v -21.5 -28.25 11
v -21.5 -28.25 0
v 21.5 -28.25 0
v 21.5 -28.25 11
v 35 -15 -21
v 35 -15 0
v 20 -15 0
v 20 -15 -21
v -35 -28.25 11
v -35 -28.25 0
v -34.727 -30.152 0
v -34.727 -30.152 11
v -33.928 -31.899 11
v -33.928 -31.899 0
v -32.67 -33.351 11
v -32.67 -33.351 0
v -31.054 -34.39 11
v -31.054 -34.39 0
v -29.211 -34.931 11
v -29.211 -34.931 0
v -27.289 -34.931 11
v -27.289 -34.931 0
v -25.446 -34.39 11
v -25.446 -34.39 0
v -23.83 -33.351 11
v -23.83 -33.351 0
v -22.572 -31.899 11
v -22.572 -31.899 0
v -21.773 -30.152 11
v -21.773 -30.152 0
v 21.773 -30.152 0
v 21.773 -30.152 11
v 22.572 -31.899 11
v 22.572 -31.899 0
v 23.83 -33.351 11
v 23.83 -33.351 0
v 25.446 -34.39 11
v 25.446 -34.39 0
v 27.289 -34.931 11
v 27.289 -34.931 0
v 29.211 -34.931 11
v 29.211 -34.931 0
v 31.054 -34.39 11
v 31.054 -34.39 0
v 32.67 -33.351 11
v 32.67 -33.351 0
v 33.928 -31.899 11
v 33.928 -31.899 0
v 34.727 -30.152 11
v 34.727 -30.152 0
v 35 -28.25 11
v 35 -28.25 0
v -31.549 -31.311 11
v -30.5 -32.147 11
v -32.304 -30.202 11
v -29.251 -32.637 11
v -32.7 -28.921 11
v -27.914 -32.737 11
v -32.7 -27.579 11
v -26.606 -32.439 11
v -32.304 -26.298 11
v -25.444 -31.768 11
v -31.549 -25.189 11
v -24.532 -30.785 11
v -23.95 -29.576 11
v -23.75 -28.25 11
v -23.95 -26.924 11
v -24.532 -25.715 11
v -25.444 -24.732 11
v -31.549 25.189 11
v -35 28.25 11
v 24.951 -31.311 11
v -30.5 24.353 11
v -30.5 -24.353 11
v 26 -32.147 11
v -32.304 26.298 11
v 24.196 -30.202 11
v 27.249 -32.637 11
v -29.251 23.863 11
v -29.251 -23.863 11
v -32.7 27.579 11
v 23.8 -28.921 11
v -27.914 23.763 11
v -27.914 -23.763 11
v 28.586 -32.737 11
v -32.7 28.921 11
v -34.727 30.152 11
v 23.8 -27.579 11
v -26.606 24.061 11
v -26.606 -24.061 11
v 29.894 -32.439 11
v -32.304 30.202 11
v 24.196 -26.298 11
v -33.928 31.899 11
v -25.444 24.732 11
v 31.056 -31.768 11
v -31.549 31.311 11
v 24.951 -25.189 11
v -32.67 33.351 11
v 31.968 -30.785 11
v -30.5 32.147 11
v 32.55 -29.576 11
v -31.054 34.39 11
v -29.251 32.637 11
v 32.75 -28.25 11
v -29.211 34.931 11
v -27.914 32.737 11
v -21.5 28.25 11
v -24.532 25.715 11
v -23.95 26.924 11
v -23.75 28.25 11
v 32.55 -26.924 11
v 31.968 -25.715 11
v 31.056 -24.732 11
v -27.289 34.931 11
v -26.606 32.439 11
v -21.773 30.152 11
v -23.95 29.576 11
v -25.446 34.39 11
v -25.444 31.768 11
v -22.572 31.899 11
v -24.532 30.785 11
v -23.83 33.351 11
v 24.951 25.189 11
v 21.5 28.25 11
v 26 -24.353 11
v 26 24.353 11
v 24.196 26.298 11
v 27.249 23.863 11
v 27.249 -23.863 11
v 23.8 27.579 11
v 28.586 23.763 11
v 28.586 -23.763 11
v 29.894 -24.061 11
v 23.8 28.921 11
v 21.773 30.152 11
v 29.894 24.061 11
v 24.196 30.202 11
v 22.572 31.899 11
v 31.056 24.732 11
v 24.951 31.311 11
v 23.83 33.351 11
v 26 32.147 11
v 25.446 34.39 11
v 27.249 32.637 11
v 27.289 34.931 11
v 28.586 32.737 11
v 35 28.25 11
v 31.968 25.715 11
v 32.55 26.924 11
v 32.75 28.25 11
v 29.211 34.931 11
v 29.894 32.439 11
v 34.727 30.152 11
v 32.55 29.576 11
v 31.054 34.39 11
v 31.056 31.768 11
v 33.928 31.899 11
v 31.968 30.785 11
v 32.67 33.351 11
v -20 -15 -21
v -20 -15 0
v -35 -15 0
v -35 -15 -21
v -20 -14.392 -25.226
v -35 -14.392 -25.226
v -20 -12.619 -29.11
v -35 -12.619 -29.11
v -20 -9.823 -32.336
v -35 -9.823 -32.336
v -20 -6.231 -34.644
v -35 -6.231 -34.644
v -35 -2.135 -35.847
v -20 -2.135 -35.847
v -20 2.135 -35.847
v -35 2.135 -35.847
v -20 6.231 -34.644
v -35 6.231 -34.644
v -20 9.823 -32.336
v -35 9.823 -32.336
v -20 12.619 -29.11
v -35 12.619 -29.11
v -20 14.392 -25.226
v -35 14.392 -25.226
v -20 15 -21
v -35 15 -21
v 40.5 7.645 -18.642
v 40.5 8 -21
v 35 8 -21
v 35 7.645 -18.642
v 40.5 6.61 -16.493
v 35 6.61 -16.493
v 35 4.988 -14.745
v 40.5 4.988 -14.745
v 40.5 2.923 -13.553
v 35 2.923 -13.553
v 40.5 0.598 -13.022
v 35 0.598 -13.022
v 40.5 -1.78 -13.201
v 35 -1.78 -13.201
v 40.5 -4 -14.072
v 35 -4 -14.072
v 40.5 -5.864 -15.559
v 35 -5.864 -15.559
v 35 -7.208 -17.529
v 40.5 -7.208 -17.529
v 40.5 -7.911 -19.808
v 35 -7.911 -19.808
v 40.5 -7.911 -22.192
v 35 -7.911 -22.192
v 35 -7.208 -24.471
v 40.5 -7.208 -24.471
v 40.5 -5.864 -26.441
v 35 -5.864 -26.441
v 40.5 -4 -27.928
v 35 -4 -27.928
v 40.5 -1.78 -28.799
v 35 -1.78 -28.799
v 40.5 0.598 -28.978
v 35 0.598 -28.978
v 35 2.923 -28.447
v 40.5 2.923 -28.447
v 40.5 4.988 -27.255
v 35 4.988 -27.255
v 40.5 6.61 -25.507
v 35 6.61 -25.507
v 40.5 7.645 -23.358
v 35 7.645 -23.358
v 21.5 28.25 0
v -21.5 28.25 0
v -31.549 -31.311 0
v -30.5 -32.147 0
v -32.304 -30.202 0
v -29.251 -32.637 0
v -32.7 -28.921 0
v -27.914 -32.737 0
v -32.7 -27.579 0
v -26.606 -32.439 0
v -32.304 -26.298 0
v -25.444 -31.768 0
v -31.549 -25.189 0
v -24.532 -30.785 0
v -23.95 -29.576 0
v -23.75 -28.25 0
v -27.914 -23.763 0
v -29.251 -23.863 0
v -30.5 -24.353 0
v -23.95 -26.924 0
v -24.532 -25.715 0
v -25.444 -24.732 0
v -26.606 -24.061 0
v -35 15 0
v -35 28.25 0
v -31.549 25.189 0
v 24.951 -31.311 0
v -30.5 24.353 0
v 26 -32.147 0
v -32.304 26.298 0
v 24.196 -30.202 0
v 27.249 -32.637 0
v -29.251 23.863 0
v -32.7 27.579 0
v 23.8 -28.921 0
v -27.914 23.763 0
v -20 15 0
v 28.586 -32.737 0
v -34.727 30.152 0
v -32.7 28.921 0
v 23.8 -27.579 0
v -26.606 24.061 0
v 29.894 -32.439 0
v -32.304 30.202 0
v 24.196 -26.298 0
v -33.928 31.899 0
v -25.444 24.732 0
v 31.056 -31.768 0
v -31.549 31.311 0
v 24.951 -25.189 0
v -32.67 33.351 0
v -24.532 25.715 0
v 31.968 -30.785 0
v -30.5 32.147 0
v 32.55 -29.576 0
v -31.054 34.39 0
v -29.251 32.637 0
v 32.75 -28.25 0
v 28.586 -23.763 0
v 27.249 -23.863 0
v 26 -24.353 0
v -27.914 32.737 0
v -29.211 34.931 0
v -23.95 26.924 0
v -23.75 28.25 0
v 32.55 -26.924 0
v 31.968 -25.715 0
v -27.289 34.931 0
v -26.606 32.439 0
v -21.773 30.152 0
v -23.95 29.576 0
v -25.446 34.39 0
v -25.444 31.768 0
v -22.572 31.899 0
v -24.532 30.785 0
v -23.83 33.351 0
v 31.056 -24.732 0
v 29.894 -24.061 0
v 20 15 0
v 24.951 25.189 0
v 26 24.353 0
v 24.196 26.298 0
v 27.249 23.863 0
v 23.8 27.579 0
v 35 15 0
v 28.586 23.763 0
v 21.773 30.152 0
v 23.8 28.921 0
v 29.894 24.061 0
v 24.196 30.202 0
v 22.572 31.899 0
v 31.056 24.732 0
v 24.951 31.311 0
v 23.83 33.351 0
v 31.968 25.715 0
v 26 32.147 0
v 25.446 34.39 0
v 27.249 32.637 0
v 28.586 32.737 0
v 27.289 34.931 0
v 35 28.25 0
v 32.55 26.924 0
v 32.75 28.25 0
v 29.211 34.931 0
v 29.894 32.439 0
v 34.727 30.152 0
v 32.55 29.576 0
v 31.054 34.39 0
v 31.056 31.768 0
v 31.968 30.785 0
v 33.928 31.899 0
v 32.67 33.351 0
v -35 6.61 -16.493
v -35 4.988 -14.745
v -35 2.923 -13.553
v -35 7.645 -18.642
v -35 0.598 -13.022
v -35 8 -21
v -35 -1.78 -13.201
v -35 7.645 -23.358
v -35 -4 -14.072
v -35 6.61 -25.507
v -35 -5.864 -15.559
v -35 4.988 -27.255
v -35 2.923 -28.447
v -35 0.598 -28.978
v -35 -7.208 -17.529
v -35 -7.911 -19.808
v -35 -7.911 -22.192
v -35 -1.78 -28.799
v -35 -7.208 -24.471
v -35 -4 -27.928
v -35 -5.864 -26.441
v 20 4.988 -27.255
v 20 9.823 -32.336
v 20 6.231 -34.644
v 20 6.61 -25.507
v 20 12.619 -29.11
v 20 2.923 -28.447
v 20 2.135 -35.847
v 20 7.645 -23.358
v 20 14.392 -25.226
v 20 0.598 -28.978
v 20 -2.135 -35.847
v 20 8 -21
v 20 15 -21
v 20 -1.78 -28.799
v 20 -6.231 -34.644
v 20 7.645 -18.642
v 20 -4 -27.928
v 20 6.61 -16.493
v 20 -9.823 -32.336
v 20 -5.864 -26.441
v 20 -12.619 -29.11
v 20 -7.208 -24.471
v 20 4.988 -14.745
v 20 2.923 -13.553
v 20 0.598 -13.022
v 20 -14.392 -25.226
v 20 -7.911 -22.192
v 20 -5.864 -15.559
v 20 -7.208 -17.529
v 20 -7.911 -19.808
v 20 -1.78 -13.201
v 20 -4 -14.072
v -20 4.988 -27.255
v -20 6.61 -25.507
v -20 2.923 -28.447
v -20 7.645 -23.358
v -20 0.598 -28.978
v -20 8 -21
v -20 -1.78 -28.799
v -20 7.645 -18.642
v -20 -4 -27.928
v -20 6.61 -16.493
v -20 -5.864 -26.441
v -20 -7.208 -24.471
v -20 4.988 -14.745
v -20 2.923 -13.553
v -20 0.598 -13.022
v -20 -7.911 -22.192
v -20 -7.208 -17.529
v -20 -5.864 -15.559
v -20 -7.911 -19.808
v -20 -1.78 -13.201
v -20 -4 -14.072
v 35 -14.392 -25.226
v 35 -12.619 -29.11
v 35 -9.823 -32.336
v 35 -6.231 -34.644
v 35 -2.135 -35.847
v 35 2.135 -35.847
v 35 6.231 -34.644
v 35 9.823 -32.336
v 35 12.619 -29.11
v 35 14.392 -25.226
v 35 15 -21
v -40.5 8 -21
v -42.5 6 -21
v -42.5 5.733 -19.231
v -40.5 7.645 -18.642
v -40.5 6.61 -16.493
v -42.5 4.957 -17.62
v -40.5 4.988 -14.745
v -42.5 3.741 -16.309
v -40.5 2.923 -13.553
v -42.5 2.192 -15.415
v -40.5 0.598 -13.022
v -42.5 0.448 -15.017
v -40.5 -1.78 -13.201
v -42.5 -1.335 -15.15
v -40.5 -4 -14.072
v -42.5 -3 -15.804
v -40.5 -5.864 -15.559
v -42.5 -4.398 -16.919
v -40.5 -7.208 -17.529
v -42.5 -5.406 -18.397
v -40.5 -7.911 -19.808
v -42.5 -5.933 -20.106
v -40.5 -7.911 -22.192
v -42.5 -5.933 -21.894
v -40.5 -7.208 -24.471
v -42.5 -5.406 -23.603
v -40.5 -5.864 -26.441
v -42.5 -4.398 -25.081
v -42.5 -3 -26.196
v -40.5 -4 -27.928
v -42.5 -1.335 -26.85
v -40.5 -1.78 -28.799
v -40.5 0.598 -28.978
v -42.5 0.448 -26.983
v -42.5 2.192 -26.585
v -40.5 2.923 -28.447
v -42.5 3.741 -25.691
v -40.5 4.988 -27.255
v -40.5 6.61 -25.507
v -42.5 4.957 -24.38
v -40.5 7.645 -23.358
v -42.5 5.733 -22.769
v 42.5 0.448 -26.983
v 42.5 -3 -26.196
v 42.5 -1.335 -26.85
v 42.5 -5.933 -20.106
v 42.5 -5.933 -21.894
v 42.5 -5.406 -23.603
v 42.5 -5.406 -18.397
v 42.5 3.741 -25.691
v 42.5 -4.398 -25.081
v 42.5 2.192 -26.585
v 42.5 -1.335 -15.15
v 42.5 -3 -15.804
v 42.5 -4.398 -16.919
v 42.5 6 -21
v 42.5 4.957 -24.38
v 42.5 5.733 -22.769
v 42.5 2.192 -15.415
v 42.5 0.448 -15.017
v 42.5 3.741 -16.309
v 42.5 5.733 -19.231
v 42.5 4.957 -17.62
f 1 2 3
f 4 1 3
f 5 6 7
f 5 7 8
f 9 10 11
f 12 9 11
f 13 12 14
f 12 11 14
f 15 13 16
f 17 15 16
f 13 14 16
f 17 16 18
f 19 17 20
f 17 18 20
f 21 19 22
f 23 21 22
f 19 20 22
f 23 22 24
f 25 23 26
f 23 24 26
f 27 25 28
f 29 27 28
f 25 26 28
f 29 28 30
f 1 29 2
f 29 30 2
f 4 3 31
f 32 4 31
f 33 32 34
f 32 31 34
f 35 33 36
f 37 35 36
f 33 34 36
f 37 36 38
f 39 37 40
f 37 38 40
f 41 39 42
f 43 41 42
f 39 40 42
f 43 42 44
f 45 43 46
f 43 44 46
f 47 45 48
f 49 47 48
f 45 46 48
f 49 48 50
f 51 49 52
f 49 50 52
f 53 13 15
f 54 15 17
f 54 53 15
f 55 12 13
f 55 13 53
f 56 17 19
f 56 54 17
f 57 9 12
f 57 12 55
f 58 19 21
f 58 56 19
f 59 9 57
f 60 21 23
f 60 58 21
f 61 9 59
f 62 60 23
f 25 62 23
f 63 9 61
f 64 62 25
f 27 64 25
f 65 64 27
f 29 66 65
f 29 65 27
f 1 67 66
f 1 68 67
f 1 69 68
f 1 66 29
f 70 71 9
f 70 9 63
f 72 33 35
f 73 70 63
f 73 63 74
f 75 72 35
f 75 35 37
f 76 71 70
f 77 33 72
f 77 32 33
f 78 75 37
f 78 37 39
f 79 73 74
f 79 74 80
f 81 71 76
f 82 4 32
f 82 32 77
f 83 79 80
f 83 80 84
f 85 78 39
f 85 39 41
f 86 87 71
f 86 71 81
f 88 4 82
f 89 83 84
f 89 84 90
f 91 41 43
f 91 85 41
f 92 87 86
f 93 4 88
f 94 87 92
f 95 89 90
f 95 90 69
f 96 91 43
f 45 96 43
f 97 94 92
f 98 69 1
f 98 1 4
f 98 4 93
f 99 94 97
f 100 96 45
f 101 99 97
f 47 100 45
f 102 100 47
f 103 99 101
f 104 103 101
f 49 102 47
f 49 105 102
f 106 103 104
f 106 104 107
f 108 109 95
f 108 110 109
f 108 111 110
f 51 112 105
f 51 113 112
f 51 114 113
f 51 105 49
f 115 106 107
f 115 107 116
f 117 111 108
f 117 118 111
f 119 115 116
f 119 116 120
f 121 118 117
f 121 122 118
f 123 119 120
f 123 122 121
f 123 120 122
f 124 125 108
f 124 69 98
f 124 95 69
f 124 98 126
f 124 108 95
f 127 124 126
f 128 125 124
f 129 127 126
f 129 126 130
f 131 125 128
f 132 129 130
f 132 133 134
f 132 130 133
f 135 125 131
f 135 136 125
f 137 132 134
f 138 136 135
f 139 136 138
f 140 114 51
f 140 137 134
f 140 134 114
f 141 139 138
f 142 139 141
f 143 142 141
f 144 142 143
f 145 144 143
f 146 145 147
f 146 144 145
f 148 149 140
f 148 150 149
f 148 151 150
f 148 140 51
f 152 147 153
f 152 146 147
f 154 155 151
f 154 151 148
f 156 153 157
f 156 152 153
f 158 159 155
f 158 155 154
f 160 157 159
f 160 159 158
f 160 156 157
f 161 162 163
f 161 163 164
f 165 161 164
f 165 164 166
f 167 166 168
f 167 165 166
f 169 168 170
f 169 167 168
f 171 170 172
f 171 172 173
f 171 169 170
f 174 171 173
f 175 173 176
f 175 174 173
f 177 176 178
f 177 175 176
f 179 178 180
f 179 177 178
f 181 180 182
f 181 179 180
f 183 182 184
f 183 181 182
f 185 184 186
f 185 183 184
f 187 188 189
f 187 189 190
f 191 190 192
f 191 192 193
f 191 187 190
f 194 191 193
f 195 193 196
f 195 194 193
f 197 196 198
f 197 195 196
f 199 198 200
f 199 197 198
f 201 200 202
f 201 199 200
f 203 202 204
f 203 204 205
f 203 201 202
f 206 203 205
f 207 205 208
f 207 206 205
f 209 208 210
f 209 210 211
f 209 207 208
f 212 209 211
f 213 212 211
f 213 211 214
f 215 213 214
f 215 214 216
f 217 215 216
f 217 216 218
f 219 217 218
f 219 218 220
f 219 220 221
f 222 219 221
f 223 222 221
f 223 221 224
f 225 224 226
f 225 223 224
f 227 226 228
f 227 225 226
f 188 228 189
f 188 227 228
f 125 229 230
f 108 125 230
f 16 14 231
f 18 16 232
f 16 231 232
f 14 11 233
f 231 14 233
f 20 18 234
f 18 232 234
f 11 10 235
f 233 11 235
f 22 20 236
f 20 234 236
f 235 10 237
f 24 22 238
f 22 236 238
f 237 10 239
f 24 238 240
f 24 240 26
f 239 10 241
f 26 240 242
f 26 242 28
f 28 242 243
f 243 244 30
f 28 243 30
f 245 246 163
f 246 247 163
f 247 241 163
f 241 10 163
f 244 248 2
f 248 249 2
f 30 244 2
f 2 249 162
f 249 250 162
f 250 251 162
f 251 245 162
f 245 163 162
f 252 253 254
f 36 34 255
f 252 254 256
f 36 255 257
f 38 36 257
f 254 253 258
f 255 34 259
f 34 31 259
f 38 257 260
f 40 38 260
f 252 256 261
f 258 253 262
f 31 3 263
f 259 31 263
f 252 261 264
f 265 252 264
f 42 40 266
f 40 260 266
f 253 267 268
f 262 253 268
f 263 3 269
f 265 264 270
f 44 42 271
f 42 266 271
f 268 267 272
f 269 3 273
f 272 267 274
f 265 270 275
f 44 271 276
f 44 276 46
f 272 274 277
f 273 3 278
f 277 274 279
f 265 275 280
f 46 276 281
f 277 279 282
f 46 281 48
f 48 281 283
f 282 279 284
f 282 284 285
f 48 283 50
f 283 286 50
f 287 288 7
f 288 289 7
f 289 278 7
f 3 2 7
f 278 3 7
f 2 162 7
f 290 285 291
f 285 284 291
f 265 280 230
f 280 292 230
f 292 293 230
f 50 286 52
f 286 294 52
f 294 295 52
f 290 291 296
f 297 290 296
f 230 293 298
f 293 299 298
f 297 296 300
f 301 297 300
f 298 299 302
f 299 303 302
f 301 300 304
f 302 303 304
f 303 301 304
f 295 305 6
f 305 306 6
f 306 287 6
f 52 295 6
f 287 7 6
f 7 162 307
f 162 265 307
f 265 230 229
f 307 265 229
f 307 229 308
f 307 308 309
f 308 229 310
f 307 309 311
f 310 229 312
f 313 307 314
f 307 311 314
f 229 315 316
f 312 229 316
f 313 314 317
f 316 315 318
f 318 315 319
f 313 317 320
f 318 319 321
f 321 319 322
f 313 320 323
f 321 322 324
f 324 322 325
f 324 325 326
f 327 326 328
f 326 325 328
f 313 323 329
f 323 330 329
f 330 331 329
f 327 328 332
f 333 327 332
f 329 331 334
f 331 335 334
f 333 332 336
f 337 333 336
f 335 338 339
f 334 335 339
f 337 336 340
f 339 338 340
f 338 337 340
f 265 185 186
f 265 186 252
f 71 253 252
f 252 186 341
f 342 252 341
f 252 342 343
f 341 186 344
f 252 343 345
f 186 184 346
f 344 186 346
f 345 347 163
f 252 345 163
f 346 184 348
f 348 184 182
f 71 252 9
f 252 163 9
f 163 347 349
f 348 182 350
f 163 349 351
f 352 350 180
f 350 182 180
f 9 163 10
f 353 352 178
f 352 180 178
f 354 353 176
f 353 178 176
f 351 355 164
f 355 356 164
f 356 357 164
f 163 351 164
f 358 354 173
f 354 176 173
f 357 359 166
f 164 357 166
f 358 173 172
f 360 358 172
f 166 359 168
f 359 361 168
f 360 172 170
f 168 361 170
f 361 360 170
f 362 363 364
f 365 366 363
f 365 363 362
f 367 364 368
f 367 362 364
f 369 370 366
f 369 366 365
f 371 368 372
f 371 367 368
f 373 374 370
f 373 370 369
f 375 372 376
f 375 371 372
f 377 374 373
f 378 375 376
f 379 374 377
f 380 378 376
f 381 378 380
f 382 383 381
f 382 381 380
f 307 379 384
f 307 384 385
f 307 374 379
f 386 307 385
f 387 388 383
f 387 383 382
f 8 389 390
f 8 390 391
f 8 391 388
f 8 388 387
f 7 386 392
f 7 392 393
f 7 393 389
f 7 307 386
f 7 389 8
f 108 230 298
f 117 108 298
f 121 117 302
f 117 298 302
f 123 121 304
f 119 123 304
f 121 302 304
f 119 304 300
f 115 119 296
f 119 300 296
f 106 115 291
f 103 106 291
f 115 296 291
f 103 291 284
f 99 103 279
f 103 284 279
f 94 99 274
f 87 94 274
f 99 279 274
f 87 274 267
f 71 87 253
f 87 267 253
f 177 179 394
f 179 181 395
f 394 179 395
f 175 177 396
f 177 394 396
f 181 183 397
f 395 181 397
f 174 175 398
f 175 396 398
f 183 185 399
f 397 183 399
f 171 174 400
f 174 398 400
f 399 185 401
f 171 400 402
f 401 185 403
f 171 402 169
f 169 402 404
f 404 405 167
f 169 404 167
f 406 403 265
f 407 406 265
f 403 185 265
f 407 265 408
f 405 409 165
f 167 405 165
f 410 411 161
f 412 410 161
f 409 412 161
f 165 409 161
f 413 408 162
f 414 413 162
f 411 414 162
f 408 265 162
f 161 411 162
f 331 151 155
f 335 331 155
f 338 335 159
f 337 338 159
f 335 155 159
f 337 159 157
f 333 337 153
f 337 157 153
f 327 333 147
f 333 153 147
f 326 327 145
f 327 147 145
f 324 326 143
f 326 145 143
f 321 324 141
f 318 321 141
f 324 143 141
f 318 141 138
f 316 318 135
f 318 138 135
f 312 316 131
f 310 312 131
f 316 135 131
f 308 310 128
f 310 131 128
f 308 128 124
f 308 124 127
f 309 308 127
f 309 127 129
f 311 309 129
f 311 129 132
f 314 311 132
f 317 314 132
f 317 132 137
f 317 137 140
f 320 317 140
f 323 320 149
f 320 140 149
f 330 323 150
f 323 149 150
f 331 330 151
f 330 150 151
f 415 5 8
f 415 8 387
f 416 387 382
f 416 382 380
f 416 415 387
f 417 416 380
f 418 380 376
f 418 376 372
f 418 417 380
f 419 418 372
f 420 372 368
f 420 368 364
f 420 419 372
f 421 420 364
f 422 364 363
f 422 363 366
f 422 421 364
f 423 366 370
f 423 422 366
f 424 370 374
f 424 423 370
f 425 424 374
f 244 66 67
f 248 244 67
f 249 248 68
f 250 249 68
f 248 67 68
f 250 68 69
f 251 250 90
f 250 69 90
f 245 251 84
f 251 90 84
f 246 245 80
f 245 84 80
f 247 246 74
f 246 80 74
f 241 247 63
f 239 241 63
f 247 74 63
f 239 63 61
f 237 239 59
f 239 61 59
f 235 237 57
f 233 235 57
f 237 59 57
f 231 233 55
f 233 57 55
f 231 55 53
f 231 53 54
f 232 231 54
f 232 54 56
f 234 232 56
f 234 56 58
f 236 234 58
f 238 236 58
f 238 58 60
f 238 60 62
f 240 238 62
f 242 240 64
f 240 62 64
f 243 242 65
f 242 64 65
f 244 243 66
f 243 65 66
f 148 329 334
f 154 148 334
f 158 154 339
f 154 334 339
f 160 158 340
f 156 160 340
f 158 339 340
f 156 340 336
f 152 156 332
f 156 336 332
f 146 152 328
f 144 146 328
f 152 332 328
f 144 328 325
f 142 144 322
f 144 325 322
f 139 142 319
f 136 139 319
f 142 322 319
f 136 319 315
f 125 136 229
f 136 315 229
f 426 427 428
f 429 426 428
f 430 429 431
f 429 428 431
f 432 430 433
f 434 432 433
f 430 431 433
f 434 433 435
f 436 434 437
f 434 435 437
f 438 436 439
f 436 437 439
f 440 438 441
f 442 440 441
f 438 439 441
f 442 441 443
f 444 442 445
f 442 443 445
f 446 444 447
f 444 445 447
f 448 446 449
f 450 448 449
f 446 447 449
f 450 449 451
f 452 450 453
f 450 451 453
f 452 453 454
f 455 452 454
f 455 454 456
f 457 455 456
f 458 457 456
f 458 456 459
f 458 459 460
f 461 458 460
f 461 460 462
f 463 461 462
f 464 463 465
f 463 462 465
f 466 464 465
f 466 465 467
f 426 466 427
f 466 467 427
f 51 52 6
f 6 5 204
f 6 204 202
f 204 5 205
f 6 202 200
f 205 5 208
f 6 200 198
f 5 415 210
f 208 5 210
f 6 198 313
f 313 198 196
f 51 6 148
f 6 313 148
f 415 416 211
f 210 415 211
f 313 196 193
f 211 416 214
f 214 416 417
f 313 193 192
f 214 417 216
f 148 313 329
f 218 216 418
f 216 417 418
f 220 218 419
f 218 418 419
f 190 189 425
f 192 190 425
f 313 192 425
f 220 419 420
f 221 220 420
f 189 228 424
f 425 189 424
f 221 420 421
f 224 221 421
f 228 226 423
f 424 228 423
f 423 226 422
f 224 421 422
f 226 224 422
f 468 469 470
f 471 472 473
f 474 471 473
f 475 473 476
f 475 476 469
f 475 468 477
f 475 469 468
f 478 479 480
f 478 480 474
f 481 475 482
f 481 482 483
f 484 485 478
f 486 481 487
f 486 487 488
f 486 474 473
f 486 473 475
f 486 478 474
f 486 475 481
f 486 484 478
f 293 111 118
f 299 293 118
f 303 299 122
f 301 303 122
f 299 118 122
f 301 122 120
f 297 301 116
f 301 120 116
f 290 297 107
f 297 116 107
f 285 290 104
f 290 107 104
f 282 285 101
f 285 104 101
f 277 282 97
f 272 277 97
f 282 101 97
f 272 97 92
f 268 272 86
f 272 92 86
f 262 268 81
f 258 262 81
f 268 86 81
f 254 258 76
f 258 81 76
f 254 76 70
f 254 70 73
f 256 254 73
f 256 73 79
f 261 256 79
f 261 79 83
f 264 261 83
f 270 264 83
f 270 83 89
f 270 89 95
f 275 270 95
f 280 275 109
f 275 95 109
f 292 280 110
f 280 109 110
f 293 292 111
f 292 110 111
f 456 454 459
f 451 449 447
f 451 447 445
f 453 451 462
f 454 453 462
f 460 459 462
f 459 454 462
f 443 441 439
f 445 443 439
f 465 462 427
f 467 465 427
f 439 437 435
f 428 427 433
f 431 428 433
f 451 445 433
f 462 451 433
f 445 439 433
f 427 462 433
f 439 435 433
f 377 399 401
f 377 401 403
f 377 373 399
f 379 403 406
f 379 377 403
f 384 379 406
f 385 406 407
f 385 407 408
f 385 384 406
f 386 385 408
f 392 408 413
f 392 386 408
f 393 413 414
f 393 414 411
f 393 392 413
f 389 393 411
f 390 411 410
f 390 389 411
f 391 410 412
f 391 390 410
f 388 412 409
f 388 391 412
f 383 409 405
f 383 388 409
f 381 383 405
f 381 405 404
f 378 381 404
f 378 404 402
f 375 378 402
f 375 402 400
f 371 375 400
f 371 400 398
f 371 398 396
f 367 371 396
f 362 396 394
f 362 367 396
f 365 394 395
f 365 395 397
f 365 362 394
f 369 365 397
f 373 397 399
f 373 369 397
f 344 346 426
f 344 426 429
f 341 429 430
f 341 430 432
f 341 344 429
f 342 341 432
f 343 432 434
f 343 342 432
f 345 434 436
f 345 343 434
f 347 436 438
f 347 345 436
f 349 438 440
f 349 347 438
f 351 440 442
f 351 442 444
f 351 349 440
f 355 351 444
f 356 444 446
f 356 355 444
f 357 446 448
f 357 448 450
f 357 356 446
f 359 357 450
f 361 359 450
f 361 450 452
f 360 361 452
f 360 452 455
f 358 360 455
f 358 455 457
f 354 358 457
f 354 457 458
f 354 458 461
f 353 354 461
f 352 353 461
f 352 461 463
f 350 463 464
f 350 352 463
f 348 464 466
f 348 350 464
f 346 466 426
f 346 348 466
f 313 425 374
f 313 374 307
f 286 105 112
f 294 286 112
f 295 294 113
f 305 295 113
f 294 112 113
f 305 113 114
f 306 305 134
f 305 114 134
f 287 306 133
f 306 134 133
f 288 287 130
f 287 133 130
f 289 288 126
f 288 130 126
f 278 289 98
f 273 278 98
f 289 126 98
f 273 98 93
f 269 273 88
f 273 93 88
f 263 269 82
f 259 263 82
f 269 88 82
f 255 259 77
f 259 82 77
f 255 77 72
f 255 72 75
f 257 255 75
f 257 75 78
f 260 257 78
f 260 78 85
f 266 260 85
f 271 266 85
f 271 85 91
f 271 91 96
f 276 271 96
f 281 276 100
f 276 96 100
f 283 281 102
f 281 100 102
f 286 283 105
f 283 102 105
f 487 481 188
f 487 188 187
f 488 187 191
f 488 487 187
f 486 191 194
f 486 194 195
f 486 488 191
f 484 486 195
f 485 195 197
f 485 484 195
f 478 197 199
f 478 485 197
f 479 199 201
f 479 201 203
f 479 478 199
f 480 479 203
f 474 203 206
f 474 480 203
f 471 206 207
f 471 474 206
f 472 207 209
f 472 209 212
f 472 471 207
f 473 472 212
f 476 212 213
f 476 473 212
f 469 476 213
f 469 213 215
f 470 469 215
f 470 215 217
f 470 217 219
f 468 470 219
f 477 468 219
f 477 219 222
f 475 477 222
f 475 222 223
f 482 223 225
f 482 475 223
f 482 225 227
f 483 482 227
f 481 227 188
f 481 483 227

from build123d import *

# Parameters (mm, degrees)
F1_DEPTH  = 11
F2_R      = 4.5
F3_DEPTH  = 11
F5_R      = 8
F6_DEPTH  = 70
F7_W      = 40
F7_H      = 30
F8_DEPTH  = 36.001
F9_R      = 8
F10_DEPTH = 42.5
F11_SIZE  = 2


with BuildPart() as f1:
    # F0 (on Top) → F1 (new body)
    with BuildSketch(Plane.XY):
        with BuildLine():
            Line((21.5, 28.25), (-21.5, 28.25))
            ThreePointArc((-21.5, 28.25), (-28.25, 35), (-35, 28.25))
            Line((-35, 28.25), (-35, -28.25))
            ThreePointArc((-35, -28.25), (-28.25, -35), (-21.5, -28.25))
            Line((-21.5, -28.25), (21.5, -28.25))
            ThreePointArc((21.5, -28.25), (28.25, -35), (35, -28.25))
            Line((35, -28.25), (35, 28.25))
            ThreePointArc((35, 28.25), (28.25, 35), (21.5, 28.25))
        make_face()
    extrude(amount=F1_DEPTH)

    # F2 (on face) → F3 (cut, through all)
    with BuildSketch(Plane.XY.offset(11)):
        with Locations((-28.25, 28.25)):
            Circle(F2_R)
        with Locations((28.25, 28.25)):
            Circle(F2_R)
        with Locations((28.25, -28.25)):
            Circle(F2_R)
        with Locations((-28.25, -28.25)):
            Circle(F2_R)
    extrude(amount=-F3_DEPTH, mode=Mode.SUBTRACT)

    # F5 (on offset) → F6 (join, through all)
    with BuildSketch(Plane.YZ.offset(35)):
        with BuildLine():
            Line((15, -21), (15, 0))
            Line((15, 0), (-15, 0))
            Line((-15, 0), (-15, -21))
            ThreePointArc((-15, -21), (0, -36), (15, -21))
        make_face()
        with Locations((0, -21)):
            Circle(F5_R, mode=Mode.SUBTRACT)
    extrude(amount=-F6_DEPTH)

    # F7 (on face) → F8 (cut, through all)
    with BuildSketch(Plane(origin=(0, 0, 0), x_dir=(1, 0, 0), z_dir=(0, 0, -1))):
        Rectangle(F7_W, F7_H)
    extrude(amount=F8_DEPTH, mode=Mode.SUBTRACT)

    # F9 (on Right) → F10 (join, symmetric)
    with BuildSketch(Plane.YZ):
        with Locations((0, -21)):
            Circle(F9_R)
    extrude(amount=F10_DEPTH, both=True)

    # F11
    f11_edges = [f1.edges().sort_by_distance(p)[0] for p in [
        (42.5, -8, -21),
        (-42.5, -8, -21),
    ]]
    chamfer(f11_edges, length=F11_SIZE)


solid = f1.part
